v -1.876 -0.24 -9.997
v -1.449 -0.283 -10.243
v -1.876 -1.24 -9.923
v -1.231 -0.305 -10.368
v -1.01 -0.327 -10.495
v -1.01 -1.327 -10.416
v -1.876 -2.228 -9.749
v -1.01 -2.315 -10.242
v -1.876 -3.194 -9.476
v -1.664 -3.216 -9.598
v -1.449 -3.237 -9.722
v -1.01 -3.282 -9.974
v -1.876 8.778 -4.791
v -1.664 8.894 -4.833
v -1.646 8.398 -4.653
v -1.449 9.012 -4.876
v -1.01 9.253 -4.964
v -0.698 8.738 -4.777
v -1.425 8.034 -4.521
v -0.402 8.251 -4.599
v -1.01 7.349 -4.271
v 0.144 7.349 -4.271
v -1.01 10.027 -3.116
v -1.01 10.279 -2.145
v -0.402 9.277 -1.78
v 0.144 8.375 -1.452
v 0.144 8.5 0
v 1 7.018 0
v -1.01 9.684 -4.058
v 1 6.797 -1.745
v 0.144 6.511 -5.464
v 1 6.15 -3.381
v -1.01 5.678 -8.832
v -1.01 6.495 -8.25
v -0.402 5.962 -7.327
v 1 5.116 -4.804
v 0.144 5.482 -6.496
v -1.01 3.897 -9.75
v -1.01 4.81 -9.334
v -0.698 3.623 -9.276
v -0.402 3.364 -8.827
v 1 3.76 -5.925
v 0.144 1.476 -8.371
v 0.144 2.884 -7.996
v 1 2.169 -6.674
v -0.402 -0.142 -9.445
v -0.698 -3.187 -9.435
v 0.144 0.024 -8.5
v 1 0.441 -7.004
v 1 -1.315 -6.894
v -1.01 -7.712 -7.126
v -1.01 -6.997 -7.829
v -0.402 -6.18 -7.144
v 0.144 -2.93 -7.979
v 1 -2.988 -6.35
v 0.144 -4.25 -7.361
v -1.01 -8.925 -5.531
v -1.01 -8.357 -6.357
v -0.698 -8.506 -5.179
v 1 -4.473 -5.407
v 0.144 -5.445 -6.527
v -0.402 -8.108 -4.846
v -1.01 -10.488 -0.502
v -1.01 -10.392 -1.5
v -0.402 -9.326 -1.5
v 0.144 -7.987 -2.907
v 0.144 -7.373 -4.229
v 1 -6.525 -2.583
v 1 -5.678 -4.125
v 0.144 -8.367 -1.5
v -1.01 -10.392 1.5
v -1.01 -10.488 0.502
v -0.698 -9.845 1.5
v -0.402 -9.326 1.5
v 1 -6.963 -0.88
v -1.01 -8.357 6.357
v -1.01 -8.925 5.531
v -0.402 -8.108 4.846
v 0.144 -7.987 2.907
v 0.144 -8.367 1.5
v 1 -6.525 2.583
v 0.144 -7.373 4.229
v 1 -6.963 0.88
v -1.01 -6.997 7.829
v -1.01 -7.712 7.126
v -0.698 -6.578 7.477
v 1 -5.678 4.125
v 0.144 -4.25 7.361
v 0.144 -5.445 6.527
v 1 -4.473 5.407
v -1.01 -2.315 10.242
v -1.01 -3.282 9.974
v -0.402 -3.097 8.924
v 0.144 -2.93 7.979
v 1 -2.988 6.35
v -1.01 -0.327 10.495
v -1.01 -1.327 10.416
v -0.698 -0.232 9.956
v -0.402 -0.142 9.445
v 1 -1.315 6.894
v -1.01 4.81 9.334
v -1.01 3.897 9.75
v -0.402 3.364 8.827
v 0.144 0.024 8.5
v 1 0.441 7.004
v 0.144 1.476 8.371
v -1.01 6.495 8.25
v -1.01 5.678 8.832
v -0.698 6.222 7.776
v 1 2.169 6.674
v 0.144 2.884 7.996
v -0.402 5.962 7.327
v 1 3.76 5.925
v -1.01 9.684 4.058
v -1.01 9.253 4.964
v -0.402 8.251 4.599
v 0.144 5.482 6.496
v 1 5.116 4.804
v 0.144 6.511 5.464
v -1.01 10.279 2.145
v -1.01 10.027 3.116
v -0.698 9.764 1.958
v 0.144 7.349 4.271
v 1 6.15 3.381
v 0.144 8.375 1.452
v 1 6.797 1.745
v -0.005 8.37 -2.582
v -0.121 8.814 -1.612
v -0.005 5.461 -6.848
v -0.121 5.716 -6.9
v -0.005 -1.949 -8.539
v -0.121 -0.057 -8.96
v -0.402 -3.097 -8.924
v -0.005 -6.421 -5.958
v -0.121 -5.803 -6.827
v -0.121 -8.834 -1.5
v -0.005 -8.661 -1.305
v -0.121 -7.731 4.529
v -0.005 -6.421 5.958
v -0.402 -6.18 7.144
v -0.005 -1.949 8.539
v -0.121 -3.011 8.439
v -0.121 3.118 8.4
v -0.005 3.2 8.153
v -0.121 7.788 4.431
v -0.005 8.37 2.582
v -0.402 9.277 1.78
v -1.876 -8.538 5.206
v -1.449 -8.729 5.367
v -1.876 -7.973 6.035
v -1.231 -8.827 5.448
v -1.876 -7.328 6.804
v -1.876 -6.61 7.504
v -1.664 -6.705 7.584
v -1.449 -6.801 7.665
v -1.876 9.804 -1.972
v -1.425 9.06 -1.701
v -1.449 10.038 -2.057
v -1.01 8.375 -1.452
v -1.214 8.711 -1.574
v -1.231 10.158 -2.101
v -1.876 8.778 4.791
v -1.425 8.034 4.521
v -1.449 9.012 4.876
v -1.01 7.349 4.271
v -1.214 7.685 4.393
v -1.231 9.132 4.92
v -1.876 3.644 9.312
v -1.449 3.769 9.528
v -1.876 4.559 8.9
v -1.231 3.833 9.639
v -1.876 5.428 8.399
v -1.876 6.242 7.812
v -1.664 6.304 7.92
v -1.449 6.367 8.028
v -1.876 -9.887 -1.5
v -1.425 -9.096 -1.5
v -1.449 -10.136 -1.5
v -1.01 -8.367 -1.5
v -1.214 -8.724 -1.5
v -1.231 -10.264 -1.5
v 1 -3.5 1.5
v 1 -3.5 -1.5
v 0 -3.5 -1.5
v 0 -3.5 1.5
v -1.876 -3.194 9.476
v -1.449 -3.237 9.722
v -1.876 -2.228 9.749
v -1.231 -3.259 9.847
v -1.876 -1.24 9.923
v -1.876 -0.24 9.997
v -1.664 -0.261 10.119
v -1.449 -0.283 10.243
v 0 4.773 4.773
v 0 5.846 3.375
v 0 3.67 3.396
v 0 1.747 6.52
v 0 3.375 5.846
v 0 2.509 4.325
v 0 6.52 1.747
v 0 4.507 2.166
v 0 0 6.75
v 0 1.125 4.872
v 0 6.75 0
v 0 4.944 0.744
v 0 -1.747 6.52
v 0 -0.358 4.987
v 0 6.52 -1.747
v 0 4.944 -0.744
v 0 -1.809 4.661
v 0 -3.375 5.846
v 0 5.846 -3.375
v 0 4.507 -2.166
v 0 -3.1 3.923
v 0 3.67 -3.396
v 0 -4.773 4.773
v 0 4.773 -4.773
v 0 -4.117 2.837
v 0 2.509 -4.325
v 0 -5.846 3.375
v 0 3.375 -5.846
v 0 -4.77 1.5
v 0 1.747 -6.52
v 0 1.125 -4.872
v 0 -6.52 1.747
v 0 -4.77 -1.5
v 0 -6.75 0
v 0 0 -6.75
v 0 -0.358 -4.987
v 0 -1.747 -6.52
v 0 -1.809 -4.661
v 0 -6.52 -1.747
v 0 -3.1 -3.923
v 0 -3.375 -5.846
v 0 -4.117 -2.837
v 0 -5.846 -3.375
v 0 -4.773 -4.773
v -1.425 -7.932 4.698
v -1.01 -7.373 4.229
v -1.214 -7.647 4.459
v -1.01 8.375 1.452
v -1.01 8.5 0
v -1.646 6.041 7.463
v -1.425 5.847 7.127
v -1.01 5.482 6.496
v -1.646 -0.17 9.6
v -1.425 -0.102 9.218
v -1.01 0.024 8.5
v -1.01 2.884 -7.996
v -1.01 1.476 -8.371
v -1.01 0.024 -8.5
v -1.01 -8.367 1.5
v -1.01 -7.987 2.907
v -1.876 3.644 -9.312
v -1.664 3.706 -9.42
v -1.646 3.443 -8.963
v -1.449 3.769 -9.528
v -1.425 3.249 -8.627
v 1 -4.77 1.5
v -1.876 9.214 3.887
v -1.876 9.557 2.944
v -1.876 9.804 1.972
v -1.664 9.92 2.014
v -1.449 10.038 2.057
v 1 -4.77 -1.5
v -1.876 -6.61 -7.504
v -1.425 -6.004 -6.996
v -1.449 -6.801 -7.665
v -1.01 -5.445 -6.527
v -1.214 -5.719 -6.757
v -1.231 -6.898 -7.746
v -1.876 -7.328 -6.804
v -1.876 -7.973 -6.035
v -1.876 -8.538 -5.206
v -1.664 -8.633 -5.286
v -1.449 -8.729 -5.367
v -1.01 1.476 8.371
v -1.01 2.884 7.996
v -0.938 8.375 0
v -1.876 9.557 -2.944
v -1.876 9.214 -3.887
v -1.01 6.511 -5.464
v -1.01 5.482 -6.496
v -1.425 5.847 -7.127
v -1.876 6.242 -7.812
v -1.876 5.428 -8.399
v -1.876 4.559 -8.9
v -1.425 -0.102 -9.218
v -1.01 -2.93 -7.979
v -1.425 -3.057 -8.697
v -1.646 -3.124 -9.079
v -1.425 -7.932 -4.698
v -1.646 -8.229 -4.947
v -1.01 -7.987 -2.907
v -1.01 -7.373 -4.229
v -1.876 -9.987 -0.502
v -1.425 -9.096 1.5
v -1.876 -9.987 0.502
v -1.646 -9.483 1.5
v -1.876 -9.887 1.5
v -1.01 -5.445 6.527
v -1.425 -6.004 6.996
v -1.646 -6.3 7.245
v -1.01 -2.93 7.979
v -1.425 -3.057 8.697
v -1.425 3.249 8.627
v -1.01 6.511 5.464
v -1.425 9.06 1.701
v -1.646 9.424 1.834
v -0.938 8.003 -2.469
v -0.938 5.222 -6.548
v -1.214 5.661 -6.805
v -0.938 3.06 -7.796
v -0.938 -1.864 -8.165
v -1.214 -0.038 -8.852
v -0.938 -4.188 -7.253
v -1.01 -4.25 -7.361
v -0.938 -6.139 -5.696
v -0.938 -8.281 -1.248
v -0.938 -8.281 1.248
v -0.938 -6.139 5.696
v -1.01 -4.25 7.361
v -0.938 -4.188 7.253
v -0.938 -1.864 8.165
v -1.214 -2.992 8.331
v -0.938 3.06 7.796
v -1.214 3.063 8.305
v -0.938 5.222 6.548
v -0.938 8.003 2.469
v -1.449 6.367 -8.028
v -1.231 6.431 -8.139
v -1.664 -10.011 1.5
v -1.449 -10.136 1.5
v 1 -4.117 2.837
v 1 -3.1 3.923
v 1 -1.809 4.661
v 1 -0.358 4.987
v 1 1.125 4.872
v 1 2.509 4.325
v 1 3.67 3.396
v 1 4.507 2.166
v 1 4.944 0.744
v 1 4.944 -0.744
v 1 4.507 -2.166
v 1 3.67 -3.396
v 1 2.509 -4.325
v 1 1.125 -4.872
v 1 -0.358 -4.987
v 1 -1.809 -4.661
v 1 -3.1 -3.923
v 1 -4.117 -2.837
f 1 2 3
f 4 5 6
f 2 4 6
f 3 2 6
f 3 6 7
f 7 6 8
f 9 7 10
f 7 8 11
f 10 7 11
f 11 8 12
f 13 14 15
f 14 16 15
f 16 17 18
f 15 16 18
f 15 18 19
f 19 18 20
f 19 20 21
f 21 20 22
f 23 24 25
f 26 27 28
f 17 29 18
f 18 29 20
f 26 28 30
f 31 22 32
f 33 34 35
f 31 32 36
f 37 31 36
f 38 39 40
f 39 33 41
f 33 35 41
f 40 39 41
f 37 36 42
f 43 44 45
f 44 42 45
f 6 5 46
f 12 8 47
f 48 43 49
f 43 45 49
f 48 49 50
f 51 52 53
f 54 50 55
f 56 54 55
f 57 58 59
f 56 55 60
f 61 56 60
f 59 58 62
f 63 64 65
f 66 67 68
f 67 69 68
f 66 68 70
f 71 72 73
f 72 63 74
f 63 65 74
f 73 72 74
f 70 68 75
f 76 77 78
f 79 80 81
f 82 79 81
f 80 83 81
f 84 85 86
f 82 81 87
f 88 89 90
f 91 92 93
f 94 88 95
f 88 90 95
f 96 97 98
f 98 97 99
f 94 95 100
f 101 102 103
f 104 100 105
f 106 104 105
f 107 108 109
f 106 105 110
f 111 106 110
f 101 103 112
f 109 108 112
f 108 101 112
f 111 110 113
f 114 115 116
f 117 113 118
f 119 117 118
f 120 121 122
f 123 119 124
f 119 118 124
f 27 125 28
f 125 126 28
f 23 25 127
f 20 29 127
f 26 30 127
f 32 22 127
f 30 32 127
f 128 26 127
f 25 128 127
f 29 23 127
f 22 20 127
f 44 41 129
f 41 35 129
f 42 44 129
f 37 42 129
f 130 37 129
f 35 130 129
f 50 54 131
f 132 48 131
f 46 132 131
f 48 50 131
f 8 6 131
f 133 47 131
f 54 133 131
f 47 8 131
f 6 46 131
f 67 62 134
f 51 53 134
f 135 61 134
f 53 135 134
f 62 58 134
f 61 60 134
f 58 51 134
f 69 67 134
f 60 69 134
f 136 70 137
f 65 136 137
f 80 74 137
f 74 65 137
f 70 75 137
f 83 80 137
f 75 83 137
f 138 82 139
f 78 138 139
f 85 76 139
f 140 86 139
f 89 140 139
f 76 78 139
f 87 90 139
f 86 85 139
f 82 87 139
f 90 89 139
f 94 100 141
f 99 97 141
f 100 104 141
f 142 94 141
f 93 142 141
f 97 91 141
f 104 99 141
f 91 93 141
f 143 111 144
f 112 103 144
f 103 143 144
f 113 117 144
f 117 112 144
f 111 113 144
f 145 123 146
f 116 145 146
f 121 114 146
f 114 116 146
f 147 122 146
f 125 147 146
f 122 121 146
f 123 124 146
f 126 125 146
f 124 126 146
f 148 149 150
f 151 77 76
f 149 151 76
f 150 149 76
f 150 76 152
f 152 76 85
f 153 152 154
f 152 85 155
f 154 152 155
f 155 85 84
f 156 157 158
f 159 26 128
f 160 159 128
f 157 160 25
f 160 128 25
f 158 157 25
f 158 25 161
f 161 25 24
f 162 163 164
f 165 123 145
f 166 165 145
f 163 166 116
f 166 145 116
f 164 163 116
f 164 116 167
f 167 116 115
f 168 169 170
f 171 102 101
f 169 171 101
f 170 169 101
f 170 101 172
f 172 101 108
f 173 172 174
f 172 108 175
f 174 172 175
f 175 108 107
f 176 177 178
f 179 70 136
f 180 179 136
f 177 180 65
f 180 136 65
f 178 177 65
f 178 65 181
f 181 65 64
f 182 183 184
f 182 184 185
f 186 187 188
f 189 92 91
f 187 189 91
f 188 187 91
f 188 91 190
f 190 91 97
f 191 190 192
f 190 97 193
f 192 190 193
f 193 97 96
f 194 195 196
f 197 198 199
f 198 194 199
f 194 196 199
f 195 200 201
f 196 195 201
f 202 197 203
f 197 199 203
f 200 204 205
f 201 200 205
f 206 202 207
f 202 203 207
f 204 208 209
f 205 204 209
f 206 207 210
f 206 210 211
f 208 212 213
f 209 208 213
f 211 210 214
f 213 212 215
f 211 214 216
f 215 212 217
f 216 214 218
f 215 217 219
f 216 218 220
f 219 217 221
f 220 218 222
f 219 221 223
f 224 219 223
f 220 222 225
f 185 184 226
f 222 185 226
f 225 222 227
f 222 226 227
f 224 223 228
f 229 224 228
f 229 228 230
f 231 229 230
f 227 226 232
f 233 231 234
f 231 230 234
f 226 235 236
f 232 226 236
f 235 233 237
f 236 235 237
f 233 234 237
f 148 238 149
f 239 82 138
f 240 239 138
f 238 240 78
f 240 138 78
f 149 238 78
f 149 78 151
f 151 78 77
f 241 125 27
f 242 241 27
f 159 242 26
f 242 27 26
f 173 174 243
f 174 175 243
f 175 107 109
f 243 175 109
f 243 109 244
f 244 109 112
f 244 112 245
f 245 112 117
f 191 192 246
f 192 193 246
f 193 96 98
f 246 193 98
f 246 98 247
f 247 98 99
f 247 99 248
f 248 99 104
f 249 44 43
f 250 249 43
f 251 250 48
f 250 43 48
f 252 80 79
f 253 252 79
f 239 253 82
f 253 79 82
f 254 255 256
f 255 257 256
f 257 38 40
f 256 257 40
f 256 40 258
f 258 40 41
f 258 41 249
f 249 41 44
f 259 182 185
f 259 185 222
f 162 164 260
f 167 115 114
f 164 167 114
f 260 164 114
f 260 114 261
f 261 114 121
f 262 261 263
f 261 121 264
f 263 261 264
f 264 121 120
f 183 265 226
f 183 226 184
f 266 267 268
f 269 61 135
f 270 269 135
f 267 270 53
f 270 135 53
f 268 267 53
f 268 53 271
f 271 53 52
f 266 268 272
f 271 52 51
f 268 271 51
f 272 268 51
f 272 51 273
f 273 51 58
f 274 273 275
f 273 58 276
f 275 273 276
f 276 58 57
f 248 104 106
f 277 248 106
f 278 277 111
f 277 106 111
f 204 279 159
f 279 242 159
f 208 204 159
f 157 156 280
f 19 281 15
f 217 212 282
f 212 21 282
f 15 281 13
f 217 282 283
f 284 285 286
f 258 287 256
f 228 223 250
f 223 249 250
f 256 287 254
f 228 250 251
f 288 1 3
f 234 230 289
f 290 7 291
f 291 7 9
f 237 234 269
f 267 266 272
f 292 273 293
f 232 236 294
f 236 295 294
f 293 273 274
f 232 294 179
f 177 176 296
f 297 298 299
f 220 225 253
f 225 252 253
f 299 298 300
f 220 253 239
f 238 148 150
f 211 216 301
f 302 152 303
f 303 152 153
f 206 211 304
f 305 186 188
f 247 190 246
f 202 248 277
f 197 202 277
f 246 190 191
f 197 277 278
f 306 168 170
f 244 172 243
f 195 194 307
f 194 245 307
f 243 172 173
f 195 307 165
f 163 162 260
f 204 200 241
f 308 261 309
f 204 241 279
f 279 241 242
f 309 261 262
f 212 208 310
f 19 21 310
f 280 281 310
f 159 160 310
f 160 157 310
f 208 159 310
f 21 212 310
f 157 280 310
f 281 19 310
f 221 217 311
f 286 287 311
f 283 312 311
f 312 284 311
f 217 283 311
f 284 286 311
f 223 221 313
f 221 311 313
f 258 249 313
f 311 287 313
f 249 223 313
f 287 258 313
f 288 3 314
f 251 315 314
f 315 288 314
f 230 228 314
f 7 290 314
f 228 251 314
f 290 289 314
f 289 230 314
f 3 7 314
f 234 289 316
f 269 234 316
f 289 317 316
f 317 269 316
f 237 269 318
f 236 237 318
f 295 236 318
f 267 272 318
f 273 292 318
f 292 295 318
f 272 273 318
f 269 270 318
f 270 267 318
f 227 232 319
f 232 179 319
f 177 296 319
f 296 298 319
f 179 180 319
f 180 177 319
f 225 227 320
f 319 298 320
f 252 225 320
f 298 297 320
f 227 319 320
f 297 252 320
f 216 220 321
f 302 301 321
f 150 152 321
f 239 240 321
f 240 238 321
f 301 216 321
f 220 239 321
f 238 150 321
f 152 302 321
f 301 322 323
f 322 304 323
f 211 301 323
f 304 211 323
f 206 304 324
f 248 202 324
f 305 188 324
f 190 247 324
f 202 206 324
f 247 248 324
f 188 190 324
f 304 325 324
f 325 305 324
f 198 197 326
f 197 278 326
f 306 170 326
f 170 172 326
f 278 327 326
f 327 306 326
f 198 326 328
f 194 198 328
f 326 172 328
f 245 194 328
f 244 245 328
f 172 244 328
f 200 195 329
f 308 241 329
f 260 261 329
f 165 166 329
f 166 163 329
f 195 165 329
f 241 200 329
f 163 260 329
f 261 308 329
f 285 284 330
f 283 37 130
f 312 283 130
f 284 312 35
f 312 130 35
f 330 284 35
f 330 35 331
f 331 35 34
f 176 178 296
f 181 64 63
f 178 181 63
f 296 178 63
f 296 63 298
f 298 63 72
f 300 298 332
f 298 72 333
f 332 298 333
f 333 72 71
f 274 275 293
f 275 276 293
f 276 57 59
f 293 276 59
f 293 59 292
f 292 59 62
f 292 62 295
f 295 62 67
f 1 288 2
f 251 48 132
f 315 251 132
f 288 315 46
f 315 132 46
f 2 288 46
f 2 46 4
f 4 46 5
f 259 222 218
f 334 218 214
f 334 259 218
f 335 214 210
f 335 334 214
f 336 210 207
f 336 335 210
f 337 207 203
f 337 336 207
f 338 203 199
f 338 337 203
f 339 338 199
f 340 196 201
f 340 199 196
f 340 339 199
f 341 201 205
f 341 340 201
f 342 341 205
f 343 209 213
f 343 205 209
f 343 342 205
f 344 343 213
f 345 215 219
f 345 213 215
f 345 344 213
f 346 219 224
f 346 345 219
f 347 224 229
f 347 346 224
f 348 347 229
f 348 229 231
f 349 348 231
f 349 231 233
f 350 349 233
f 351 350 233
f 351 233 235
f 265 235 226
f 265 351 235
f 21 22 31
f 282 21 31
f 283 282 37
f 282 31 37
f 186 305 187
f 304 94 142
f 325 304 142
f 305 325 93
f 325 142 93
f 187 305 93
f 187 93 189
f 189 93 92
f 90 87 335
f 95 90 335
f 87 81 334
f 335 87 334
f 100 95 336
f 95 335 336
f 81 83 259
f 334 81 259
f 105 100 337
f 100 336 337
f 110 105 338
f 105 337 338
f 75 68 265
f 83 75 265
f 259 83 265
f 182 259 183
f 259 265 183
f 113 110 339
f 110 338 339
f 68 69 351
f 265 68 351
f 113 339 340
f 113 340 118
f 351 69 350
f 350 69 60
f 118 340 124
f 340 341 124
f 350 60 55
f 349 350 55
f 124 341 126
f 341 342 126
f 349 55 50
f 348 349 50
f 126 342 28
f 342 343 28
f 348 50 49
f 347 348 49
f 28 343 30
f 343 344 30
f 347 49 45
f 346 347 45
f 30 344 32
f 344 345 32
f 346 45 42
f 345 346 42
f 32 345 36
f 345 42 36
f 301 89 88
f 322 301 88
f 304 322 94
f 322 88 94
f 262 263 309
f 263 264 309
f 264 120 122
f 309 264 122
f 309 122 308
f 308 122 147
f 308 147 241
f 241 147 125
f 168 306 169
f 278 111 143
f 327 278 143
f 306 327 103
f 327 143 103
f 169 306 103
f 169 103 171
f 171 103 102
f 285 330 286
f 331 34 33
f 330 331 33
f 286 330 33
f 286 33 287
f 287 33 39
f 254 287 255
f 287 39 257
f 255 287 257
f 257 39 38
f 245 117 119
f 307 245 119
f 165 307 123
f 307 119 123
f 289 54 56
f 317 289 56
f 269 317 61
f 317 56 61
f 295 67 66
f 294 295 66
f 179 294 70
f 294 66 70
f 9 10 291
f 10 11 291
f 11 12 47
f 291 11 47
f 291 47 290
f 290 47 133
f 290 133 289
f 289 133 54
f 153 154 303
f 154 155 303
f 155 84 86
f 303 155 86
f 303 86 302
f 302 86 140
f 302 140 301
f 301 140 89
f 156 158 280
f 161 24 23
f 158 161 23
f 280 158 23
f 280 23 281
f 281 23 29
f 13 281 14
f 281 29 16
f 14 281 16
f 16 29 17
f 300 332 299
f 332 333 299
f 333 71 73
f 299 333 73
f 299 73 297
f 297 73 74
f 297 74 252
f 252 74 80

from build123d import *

# Parameters (mm, degrees)
ODEBRAT_VYSUNUT_M1_REACH = 17.125
ODEBRAT_VYSUNUT_M2_REACH = 17.125
KRUHOV_POLE1_COUNT       = 9


with BuildPart() as part:
    # Skica1 → Otočit kolem osy1 (revolve)
    with BuildSketch(Plane.XY):
        Polygon((0, 0), (0, 6.75), (-1.876388375, 10), (-1.010362971, 10.5), (1, 7.017949192), (1, 0), align=None)
    revolve(axis=Axis((0, 0, 0), (-1, 0, 0)))

    # Skica2 → Odebrat vysunutím1 (cut, up to next)
    with BuildSketch(Plane(origin=(1, 0, 0), x_dir=(0, 0, -1), z_dir=(1, 0, 0)), mode=Mode.PRIVATE) as odebrat_vysunut_m1_sk1:
        with BuildLine():
            Line((1.5, -4.769696007), (1.5, -3.5))
            Line((1.5, -3.5), (-1.5, -3.5))
            Line((-1.5, -3.5), (-1.5, -4.769696007))
            ThreePointArc((-1.5, -4.769696007), (0, 5), (1.5, -4.769696007))
        make_face()
    odebrat_vysunut_m1_tool1 = extrude(odebrat_vysunut_m1_sk1.sketch, amount=-ODEBRAT_VYSUNUT_M1_REACH, mode=Mode.PRIVATE) & part.part
    add(odebrat_vysunut_m1_tool1.solids().sort_by_distance((1, 0.242366, 0))[0], mode=Mode.SUBTRACT)

    # Skica3 → Odebrat vysunutím2 (cut, up to next)
    with BuildSketch(Plane(origin=(1, 0, 0), x_dir=(0, 0, -1), z_dir=(1, 0, 0)), mode=Mode.PRIVATE) as odebrat_vysunut_m2_sk1:
        with BuildLine():
            Line((-1.5, -10.392304845), (-1.5, -8.366600265))
            ThreePointArc((-1.5, -8.366600265), (-2.907171218, -7.987387277), (-4.228880321, -7.373369056))
            Line((-4.228880321, -7.373369056), (-5.530978126, -8.925148793))
            ThreePointArc((-5.530978126, -8.925148793), (-3.591211505, -9.866772518), (-1.5, -10.392304845))
        make_face()
    odebrat_vysunut_m2_tool1 = extrude(odebrat_vysunut_m2_sk1.sketch, amount=-ODEBRAT_VYSUNUT_M2_REACH, mode=Mode.PRIVATE) & part.part
    odebrat_vysunut_m2 = odebrat_vysunut_m2_tool1.solids().sort_by_distance((1, -8.932717, 3.251243))[0]
    add(odebrat_vysunut_m2, mode=Mode.SUBTRACT)

    # Kruhové pole1: Odebrat vysunutím2 ×9 about axis
    kruhov_pole1_axis = Axis((0, 0, 0), (1, 0, 0))
    for i in range(1, KRUHOV_POLE1_COUNT):
        add(odebrat_vysunut_m2.rotate(kruhov_pole1_axis, i * 360 / KRUHOV_POLE1_COUNT), mode=Mode.SUBTRACT)


solid = part.part
